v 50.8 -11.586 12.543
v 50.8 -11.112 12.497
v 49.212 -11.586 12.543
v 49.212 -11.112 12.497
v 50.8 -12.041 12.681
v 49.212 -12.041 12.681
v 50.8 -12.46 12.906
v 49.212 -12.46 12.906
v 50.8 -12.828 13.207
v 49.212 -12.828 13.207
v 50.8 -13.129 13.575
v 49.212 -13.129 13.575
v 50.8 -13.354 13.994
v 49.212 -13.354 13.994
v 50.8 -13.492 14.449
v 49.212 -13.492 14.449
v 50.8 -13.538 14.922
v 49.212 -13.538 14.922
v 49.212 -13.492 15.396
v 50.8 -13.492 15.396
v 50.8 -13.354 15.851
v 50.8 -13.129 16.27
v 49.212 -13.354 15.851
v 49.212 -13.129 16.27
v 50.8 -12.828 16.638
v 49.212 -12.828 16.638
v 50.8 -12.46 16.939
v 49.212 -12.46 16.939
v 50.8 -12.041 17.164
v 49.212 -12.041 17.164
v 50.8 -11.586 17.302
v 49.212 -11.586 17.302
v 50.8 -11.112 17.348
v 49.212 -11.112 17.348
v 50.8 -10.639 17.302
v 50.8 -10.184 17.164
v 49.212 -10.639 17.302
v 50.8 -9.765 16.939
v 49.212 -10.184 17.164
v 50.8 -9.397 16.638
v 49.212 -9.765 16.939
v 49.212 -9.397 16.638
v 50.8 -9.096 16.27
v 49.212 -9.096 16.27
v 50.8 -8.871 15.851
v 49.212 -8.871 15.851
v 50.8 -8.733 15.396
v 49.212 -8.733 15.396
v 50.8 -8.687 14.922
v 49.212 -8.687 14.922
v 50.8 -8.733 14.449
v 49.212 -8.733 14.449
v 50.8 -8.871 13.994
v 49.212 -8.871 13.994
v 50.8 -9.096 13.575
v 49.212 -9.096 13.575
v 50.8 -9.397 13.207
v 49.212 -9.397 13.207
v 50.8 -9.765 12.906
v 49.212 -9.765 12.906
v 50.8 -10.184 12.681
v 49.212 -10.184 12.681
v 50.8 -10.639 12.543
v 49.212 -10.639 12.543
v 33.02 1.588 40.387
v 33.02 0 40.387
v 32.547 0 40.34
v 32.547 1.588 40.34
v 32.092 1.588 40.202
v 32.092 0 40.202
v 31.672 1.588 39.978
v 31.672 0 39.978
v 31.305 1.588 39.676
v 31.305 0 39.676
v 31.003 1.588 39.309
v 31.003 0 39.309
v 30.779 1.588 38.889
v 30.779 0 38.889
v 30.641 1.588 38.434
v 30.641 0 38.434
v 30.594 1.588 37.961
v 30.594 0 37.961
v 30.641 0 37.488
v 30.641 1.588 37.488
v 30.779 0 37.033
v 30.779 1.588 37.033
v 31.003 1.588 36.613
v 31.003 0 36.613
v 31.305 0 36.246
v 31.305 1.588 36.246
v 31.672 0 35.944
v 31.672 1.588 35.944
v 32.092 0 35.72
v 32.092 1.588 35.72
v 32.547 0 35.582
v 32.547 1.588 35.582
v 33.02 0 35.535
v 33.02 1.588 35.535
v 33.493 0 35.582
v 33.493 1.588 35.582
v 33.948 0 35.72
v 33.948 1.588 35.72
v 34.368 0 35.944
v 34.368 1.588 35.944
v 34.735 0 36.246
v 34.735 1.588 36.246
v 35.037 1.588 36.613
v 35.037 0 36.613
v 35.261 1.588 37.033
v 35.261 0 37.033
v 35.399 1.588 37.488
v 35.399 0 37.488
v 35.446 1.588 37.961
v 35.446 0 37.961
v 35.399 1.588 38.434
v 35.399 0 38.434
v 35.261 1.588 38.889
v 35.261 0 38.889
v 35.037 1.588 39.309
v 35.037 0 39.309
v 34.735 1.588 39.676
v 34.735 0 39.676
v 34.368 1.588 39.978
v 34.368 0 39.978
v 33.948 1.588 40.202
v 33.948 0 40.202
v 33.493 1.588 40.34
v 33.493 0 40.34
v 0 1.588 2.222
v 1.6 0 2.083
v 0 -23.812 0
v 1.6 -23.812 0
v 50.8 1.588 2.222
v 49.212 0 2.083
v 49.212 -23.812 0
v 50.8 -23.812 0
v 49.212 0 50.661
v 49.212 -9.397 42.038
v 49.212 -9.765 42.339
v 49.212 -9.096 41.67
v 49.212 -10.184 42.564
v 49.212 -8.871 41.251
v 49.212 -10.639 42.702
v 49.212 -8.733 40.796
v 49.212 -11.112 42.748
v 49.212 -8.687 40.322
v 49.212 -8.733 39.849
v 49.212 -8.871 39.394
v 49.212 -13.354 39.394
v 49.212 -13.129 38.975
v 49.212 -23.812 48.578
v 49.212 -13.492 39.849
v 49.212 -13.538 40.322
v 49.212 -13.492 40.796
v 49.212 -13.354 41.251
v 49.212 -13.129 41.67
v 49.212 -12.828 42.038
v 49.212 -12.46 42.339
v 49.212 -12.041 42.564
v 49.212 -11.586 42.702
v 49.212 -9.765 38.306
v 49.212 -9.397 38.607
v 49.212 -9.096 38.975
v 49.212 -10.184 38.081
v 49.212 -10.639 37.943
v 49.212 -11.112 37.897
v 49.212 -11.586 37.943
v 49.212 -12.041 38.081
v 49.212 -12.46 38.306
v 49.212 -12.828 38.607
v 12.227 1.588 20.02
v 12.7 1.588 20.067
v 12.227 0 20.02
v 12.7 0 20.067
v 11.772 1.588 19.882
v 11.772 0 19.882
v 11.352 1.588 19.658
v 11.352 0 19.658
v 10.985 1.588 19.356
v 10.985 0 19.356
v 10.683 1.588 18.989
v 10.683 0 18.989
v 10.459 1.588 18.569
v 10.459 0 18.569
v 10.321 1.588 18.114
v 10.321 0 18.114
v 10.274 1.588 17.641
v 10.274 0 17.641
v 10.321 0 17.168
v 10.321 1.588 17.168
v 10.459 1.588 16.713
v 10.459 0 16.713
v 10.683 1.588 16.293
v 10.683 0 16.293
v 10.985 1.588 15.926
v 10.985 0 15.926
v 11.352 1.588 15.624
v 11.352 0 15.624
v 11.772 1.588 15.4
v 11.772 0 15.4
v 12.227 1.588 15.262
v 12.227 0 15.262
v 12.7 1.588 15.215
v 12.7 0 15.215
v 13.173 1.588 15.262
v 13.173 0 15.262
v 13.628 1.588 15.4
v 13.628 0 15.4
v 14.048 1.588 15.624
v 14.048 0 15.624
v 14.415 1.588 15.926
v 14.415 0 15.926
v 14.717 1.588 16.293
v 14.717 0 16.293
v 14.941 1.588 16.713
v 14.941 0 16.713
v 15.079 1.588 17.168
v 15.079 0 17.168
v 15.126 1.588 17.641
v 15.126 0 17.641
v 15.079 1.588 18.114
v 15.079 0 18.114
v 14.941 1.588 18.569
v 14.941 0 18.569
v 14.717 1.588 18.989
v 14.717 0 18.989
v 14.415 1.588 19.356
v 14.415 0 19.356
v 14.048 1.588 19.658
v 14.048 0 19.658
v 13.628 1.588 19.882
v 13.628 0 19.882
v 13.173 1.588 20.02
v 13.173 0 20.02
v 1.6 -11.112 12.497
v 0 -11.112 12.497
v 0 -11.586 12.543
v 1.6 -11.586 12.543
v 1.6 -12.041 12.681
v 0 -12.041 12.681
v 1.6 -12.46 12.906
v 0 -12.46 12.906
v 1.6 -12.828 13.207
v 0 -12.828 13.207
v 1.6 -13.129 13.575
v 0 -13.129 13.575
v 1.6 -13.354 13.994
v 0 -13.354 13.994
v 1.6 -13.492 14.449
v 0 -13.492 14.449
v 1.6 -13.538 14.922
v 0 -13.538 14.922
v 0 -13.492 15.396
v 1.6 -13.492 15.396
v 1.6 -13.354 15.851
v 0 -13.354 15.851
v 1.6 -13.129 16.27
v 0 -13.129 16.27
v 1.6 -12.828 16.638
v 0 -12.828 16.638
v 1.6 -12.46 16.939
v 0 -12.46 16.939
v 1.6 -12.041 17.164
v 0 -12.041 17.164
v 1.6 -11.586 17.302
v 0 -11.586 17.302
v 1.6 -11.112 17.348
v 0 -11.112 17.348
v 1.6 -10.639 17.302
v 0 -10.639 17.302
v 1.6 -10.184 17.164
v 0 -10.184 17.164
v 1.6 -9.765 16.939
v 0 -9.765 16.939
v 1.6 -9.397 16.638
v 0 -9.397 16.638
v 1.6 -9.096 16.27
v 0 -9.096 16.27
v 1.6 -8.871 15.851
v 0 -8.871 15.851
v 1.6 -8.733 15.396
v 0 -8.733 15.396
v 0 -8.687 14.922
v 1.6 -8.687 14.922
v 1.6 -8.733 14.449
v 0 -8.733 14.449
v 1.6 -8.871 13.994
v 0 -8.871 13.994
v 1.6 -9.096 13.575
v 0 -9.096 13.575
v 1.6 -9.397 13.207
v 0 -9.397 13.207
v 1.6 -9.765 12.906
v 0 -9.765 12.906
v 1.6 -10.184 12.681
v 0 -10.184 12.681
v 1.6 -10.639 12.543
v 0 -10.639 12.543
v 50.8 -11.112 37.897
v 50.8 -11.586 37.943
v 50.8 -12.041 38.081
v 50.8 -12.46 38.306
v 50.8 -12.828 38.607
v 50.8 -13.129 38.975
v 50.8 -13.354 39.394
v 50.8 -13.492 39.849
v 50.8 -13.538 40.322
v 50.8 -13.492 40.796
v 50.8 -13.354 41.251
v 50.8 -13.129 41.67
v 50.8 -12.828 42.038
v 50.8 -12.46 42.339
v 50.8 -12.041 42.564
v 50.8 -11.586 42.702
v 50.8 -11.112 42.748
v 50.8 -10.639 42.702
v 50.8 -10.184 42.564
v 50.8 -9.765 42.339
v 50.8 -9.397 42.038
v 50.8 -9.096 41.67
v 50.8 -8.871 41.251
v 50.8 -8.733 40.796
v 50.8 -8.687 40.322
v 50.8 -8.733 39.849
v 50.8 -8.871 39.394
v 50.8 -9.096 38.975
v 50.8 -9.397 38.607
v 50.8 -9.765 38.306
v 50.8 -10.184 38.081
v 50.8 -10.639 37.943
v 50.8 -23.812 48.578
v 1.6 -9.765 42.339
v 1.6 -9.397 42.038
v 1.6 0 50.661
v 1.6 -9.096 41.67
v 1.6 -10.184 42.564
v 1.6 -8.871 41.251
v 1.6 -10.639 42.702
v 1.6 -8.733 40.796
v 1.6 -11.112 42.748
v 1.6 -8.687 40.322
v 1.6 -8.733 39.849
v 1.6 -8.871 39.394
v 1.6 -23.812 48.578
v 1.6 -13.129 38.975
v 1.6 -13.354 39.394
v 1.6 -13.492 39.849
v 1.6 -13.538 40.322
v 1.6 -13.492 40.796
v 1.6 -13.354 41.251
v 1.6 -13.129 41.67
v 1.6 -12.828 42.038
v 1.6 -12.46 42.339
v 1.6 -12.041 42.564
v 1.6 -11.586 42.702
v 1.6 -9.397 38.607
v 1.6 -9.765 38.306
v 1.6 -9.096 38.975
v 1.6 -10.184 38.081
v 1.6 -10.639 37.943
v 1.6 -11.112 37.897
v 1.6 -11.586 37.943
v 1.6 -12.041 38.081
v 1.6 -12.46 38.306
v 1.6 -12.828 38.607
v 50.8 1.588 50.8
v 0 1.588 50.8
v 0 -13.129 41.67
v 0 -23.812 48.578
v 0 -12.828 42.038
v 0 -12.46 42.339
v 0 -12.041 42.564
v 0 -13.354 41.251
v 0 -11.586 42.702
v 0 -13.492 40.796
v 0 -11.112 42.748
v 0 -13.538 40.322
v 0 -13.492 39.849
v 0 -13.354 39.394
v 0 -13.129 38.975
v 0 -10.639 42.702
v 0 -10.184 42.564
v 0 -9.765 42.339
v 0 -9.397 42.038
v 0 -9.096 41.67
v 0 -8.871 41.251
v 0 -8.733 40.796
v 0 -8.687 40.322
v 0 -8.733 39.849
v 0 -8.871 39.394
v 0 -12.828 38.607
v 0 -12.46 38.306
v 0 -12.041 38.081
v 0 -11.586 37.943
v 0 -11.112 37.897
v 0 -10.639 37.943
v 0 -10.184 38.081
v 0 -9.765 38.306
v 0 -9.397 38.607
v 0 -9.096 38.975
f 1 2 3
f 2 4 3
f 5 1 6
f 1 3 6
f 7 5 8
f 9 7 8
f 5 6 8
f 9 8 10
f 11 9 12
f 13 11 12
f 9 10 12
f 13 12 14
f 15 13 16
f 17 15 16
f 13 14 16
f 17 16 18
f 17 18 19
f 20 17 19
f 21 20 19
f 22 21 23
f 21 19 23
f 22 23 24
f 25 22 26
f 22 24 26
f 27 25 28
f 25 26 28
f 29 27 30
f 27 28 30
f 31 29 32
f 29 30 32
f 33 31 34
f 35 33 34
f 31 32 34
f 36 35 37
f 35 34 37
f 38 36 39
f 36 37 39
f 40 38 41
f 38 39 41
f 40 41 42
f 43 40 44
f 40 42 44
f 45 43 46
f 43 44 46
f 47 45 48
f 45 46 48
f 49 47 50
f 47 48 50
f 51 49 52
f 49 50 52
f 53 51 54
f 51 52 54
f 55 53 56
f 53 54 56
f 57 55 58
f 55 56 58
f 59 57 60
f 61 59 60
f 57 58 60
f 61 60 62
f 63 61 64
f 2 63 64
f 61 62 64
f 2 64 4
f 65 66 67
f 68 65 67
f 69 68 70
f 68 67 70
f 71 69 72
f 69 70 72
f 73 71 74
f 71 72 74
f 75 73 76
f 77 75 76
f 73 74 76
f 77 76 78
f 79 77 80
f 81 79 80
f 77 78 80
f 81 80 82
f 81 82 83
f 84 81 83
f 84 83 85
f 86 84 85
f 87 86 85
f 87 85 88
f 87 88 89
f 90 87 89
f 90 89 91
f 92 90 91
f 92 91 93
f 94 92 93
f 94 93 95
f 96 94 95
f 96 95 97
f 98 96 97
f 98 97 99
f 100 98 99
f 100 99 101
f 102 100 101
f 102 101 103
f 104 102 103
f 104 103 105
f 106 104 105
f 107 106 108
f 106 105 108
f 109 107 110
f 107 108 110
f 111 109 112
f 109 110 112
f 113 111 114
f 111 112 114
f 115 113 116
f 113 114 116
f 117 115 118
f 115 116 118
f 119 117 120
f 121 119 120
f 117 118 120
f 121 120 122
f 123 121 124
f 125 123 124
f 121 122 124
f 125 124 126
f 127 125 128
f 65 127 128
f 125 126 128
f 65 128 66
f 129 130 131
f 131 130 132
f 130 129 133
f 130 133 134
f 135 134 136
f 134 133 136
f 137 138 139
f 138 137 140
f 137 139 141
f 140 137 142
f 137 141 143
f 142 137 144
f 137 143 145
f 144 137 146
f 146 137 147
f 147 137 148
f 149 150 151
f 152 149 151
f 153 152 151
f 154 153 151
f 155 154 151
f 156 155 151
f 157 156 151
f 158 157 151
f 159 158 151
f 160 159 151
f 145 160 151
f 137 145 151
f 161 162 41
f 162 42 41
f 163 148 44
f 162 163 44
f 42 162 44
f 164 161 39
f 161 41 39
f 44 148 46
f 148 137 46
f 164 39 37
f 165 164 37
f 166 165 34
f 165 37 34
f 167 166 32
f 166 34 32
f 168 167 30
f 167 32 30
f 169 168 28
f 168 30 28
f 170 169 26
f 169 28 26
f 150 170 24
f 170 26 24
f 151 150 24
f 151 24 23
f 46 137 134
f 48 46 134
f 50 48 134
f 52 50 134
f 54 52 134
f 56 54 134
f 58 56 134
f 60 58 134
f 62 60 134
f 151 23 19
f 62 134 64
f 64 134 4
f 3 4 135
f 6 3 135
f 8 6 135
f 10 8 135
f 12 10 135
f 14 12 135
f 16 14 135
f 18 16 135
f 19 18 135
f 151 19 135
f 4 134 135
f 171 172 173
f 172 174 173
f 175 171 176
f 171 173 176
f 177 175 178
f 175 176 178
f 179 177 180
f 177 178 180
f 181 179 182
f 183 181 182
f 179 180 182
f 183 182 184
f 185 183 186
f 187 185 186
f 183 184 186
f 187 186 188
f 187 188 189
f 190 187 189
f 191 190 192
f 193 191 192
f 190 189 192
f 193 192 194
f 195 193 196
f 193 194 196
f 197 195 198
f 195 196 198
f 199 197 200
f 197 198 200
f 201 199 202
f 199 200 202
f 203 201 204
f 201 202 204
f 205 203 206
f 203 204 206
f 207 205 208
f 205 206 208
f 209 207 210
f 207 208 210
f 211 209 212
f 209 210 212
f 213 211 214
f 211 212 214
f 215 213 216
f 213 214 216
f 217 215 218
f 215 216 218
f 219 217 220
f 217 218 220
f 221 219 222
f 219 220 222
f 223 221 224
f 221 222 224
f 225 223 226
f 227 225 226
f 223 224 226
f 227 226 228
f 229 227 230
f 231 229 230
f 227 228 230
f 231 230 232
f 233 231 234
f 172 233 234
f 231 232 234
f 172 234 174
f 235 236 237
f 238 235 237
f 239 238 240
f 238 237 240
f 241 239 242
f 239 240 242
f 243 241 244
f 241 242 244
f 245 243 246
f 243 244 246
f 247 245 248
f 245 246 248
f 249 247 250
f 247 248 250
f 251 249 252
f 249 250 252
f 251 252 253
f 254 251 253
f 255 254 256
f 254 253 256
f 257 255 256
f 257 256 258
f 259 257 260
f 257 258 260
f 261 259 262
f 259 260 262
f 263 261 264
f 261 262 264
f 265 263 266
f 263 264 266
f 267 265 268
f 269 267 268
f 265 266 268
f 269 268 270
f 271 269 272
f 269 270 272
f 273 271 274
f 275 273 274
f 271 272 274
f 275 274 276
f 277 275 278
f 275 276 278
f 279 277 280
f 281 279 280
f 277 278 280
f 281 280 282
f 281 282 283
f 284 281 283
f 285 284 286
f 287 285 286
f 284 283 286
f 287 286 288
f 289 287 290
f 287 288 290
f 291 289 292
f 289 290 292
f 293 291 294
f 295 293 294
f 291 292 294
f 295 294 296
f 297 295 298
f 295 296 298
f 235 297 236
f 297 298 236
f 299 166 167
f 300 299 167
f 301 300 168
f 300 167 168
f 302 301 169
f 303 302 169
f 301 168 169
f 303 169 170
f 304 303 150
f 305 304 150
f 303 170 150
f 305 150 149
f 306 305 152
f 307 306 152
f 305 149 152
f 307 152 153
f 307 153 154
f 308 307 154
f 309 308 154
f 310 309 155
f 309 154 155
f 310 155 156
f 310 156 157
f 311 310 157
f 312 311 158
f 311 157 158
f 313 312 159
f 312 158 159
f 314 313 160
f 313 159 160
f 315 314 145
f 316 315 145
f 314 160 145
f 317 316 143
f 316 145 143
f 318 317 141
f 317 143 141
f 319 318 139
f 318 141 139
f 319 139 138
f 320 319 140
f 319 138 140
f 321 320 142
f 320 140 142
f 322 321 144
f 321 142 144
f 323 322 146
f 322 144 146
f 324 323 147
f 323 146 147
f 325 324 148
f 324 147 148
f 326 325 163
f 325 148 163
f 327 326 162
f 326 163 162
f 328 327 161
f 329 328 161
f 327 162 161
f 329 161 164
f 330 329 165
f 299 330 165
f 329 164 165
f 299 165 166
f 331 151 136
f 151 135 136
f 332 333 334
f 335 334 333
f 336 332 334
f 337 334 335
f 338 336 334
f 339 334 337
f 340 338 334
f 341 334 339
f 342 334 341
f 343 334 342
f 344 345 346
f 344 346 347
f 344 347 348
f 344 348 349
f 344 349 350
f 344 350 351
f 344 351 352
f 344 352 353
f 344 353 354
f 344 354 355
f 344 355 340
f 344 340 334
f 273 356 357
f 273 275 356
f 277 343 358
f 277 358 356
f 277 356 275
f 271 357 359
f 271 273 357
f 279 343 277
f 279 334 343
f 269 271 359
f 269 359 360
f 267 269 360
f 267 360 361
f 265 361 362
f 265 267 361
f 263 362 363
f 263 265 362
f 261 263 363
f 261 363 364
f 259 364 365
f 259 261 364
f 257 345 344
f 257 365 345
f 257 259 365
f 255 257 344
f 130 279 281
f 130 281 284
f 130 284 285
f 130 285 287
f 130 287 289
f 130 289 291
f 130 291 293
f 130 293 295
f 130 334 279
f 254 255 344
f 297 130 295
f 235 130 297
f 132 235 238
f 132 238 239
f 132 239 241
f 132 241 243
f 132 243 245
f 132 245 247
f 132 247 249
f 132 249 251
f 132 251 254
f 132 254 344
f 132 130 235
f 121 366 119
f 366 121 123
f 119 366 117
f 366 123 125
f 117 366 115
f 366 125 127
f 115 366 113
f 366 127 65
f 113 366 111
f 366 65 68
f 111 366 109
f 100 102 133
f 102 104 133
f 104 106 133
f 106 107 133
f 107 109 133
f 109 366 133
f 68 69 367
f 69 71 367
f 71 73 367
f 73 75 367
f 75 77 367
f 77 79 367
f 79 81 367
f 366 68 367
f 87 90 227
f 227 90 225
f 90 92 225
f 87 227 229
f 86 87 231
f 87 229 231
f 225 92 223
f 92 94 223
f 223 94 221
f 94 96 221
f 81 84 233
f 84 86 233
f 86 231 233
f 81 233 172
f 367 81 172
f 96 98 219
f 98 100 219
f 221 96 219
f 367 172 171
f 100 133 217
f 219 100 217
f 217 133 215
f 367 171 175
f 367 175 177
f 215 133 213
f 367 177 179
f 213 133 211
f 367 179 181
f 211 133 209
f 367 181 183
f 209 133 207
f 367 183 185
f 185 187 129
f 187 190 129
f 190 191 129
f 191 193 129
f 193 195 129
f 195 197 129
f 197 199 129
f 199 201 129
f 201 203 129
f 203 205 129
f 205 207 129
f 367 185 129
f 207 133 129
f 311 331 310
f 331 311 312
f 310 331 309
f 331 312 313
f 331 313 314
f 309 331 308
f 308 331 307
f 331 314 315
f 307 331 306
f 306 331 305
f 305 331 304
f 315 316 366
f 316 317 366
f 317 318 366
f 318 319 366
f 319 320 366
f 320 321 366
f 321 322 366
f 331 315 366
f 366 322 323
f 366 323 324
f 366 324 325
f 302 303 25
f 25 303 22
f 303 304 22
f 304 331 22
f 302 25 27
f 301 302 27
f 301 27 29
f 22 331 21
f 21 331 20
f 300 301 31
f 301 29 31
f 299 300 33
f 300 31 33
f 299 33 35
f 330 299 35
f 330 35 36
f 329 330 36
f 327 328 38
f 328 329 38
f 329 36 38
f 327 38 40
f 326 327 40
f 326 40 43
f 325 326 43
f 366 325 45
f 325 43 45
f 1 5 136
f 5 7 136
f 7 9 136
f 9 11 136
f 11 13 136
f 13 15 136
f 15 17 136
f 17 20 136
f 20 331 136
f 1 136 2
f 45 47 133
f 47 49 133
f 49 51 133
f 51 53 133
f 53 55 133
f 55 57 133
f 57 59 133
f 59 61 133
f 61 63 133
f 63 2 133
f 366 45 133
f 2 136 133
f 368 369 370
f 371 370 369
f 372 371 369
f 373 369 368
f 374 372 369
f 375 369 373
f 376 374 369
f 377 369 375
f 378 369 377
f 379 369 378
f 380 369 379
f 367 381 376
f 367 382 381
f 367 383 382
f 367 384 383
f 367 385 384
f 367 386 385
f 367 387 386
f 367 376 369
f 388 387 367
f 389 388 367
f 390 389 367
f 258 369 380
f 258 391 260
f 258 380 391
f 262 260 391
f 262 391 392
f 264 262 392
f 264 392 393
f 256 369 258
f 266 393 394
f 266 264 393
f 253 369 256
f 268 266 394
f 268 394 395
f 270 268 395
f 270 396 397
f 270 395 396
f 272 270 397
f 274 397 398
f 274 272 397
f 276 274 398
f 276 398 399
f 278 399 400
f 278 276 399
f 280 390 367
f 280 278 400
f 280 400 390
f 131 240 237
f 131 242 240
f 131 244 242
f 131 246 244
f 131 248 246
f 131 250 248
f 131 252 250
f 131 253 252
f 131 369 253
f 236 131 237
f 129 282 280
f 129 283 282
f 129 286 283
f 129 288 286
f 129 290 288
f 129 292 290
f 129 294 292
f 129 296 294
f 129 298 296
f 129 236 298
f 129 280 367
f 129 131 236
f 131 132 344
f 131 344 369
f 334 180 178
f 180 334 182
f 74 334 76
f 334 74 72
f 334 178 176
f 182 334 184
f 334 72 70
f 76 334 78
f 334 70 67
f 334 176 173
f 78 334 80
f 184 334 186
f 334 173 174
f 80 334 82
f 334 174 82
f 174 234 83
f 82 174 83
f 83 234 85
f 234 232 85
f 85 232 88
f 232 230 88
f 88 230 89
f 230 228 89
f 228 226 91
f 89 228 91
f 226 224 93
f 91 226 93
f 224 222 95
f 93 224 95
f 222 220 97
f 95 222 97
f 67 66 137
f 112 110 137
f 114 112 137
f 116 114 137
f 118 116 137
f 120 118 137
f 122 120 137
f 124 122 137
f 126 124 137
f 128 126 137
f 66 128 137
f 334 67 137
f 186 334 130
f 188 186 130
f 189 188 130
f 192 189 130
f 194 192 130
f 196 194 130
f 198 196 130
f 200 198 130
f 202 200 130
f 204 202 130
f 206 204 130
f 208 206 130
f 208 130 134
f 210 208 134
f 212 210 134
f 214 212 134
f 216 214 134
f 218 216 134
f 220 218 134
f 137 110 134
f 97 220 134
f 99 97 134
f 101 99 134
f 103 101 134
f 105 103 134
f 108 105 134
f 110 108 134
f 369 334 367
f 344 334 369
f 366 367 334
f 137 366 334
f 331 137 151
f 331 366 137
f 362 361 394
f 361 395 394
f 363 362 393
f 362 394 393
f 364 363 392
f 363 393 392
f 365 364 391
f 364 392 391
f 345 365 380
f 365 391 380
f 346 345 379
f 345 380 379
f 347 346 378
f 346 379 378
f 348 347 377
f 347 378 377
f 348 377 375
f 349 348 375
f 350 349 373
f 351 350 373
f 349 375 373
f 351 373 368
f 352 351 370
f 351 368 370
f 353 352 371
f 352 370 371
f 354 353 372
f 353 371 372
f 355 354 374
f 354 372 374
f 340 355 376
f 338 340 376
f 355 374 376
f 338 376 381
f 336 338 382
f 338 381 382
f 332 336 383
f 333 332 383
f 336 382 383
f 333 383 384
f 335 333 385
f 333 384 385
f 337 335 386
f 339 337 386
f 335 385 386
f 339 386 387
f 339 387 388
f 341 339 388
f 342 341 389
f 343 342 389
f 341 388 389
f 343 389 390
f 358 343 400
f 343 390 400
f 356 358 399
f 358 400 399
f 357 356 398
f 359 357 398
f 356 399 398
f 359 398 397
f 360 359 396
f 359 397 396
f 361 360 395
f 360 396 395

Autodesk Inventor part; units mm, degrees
ref_plane "YZ Plane" through (0, 0, 0) normal (1, 0, 0) x (0, 1, 0)
ref_plane "XZ Plane" through (0, 0, 0) normal (0, 1, 0) x (-1, 0, 0)
ref_plane "XY Plane" through (0, 0, 0) normal (0, 0, 1) x (1, 0, 0)
sketch "Sketch5" plane through (0, 0, 0) normal (0, 0, 1) x (1, 0, 0)
  line L0 (1.6002, 0) -> (49.2125, 0)
  line L1 (50.8, 0) -> (50.8, 1.5875)
  line L2 (50.8, 1.5875) -> (0, 1.5875)
  line L3 (0, 1.5875) -> (0, 0)
  line L4 (50.8, 1.5875) -> (49.2125, 1.5875)
  line L5 (49.2125, 0) -> (49.2125, -23.8125)
  line L6 (49.2125, -23.8125) -> (50.8, -23.8125)
  line L7 (50.8, -23.8125) -> (50.8, 1.5875)
  line L8 (49.2125, 0) -> (49.2125, 1.5875)
  line L9 (0, 1.5875) -> (1.6002, 1.5875)
  line L10 (1.6002, 0) -> (1.6002, -23.8125)
  line L11 (1.6002, -23.8125) -> (0, -23.8125)
  line L12 (0, -23.8125) -> (0, 1.5875)
  dimension "d12" = 50.8
  dimension "d13" = 1.5875
  dimension "d14" = 25.4
  dimension "d15" = 1.5875
  dimension "d46" = 1.6002
extrude "Extrusion4" add sketch "Sketch5" along normal blind 50.8
sketch "Sketch6" plane through (50.8, -23.8125, 0) normal (1, 0, 0) x (0, 0, -1)
  line L0 (-50.8, 0) -> (-50.8, 25.4) projected
  line L1 (-50.8, 25.4) -> (-50.8, 0)
  line L2 (-50.8, 25.4) -> (-48.5778, 0)
  line L3 (-50.8, 23.8125) -> (-50.8, 0) projected
  line L4 (-48.5778, 0) -> (-50.8, 0)
  line L5 (0, 25.4) -> (-50.8, 25.4) projected
  point P0 (0, 23.8125)
  dimension "d18" = 85
extrude "Extrusion5" cut sketch "Sketch6" against normal blind 228.6
sketch "Sketch7" plane through (50.8, -23.8125, 0) normal (1, 0, 0) x (0, 0, -1)
  line L0 (0, 0) -> (0, 25.4) projected
  line L1 (0, 25.4) -> (-50.8, 25.4) projected
  point P0 (0, 23.8125)
  point P1 (-40.3225, 12.7)
  point P2 (-14.9225, 12.7)
  dimension "d21" = 40.3225
  dimension "d22" = 14.9225
  dimension "d30" = 12.7
  dimension "d31" = 12.7
hole "Hole1" at (50.8, -11.1125, 40.3225) at (50.8, -11.1125, 14.9225) direction (-1, 0, 0) diameter 4.8514 end through all
sketch "Sketch8" plane through (50.8, -23.8125, 0) normal (1, 0, 0) x (0, 0, -1)
  line L0 (0, 0) -> (0, 25.4) projected
  line L1 (0, 0) -> (0, 25.4)
  line L2 (0, 25.4) -> (0, 0)
  line L3 (-2.2222, 25.4) -> (0, 0)
  line L4 (0, 25.4) -> (-50.8, 25.4) projected
  line L5 (-2.2222, 25.4) -> (0, 25.4)
  point P0 (0, 23.8125)
  dimension "d32" = 5
extrude "Extrusion6" cut sketch "Sketch8" against normal blind 228.6
sketch "Sketch9" plane through (0, 1.5875, 50.6611) normal (0, -1, 0) x (1, 0, 0)
  line L0 (49.2125, 0) -> (1.6002, 0) projected
  line L1 (0, -50.6611) -> (0, -2.0833) projected
  point P0 (12.7, -33.02)
  point P1 (33.02, -12.7)
  dimension "d35" = 12.7
  dimension "d37" = 33.02
  dimension "d47" = 33.02
  dimension "d48" = 12.7
hole "Hole2" at (12.7, 1.5875, 17.6411) at (33.02, 1.5875, 37.9611) direction (0, -1, 0) diameter 4.8514 end through all
properties part number "CAR_039_SweeperBarMount" material "Aluminum 6061"
